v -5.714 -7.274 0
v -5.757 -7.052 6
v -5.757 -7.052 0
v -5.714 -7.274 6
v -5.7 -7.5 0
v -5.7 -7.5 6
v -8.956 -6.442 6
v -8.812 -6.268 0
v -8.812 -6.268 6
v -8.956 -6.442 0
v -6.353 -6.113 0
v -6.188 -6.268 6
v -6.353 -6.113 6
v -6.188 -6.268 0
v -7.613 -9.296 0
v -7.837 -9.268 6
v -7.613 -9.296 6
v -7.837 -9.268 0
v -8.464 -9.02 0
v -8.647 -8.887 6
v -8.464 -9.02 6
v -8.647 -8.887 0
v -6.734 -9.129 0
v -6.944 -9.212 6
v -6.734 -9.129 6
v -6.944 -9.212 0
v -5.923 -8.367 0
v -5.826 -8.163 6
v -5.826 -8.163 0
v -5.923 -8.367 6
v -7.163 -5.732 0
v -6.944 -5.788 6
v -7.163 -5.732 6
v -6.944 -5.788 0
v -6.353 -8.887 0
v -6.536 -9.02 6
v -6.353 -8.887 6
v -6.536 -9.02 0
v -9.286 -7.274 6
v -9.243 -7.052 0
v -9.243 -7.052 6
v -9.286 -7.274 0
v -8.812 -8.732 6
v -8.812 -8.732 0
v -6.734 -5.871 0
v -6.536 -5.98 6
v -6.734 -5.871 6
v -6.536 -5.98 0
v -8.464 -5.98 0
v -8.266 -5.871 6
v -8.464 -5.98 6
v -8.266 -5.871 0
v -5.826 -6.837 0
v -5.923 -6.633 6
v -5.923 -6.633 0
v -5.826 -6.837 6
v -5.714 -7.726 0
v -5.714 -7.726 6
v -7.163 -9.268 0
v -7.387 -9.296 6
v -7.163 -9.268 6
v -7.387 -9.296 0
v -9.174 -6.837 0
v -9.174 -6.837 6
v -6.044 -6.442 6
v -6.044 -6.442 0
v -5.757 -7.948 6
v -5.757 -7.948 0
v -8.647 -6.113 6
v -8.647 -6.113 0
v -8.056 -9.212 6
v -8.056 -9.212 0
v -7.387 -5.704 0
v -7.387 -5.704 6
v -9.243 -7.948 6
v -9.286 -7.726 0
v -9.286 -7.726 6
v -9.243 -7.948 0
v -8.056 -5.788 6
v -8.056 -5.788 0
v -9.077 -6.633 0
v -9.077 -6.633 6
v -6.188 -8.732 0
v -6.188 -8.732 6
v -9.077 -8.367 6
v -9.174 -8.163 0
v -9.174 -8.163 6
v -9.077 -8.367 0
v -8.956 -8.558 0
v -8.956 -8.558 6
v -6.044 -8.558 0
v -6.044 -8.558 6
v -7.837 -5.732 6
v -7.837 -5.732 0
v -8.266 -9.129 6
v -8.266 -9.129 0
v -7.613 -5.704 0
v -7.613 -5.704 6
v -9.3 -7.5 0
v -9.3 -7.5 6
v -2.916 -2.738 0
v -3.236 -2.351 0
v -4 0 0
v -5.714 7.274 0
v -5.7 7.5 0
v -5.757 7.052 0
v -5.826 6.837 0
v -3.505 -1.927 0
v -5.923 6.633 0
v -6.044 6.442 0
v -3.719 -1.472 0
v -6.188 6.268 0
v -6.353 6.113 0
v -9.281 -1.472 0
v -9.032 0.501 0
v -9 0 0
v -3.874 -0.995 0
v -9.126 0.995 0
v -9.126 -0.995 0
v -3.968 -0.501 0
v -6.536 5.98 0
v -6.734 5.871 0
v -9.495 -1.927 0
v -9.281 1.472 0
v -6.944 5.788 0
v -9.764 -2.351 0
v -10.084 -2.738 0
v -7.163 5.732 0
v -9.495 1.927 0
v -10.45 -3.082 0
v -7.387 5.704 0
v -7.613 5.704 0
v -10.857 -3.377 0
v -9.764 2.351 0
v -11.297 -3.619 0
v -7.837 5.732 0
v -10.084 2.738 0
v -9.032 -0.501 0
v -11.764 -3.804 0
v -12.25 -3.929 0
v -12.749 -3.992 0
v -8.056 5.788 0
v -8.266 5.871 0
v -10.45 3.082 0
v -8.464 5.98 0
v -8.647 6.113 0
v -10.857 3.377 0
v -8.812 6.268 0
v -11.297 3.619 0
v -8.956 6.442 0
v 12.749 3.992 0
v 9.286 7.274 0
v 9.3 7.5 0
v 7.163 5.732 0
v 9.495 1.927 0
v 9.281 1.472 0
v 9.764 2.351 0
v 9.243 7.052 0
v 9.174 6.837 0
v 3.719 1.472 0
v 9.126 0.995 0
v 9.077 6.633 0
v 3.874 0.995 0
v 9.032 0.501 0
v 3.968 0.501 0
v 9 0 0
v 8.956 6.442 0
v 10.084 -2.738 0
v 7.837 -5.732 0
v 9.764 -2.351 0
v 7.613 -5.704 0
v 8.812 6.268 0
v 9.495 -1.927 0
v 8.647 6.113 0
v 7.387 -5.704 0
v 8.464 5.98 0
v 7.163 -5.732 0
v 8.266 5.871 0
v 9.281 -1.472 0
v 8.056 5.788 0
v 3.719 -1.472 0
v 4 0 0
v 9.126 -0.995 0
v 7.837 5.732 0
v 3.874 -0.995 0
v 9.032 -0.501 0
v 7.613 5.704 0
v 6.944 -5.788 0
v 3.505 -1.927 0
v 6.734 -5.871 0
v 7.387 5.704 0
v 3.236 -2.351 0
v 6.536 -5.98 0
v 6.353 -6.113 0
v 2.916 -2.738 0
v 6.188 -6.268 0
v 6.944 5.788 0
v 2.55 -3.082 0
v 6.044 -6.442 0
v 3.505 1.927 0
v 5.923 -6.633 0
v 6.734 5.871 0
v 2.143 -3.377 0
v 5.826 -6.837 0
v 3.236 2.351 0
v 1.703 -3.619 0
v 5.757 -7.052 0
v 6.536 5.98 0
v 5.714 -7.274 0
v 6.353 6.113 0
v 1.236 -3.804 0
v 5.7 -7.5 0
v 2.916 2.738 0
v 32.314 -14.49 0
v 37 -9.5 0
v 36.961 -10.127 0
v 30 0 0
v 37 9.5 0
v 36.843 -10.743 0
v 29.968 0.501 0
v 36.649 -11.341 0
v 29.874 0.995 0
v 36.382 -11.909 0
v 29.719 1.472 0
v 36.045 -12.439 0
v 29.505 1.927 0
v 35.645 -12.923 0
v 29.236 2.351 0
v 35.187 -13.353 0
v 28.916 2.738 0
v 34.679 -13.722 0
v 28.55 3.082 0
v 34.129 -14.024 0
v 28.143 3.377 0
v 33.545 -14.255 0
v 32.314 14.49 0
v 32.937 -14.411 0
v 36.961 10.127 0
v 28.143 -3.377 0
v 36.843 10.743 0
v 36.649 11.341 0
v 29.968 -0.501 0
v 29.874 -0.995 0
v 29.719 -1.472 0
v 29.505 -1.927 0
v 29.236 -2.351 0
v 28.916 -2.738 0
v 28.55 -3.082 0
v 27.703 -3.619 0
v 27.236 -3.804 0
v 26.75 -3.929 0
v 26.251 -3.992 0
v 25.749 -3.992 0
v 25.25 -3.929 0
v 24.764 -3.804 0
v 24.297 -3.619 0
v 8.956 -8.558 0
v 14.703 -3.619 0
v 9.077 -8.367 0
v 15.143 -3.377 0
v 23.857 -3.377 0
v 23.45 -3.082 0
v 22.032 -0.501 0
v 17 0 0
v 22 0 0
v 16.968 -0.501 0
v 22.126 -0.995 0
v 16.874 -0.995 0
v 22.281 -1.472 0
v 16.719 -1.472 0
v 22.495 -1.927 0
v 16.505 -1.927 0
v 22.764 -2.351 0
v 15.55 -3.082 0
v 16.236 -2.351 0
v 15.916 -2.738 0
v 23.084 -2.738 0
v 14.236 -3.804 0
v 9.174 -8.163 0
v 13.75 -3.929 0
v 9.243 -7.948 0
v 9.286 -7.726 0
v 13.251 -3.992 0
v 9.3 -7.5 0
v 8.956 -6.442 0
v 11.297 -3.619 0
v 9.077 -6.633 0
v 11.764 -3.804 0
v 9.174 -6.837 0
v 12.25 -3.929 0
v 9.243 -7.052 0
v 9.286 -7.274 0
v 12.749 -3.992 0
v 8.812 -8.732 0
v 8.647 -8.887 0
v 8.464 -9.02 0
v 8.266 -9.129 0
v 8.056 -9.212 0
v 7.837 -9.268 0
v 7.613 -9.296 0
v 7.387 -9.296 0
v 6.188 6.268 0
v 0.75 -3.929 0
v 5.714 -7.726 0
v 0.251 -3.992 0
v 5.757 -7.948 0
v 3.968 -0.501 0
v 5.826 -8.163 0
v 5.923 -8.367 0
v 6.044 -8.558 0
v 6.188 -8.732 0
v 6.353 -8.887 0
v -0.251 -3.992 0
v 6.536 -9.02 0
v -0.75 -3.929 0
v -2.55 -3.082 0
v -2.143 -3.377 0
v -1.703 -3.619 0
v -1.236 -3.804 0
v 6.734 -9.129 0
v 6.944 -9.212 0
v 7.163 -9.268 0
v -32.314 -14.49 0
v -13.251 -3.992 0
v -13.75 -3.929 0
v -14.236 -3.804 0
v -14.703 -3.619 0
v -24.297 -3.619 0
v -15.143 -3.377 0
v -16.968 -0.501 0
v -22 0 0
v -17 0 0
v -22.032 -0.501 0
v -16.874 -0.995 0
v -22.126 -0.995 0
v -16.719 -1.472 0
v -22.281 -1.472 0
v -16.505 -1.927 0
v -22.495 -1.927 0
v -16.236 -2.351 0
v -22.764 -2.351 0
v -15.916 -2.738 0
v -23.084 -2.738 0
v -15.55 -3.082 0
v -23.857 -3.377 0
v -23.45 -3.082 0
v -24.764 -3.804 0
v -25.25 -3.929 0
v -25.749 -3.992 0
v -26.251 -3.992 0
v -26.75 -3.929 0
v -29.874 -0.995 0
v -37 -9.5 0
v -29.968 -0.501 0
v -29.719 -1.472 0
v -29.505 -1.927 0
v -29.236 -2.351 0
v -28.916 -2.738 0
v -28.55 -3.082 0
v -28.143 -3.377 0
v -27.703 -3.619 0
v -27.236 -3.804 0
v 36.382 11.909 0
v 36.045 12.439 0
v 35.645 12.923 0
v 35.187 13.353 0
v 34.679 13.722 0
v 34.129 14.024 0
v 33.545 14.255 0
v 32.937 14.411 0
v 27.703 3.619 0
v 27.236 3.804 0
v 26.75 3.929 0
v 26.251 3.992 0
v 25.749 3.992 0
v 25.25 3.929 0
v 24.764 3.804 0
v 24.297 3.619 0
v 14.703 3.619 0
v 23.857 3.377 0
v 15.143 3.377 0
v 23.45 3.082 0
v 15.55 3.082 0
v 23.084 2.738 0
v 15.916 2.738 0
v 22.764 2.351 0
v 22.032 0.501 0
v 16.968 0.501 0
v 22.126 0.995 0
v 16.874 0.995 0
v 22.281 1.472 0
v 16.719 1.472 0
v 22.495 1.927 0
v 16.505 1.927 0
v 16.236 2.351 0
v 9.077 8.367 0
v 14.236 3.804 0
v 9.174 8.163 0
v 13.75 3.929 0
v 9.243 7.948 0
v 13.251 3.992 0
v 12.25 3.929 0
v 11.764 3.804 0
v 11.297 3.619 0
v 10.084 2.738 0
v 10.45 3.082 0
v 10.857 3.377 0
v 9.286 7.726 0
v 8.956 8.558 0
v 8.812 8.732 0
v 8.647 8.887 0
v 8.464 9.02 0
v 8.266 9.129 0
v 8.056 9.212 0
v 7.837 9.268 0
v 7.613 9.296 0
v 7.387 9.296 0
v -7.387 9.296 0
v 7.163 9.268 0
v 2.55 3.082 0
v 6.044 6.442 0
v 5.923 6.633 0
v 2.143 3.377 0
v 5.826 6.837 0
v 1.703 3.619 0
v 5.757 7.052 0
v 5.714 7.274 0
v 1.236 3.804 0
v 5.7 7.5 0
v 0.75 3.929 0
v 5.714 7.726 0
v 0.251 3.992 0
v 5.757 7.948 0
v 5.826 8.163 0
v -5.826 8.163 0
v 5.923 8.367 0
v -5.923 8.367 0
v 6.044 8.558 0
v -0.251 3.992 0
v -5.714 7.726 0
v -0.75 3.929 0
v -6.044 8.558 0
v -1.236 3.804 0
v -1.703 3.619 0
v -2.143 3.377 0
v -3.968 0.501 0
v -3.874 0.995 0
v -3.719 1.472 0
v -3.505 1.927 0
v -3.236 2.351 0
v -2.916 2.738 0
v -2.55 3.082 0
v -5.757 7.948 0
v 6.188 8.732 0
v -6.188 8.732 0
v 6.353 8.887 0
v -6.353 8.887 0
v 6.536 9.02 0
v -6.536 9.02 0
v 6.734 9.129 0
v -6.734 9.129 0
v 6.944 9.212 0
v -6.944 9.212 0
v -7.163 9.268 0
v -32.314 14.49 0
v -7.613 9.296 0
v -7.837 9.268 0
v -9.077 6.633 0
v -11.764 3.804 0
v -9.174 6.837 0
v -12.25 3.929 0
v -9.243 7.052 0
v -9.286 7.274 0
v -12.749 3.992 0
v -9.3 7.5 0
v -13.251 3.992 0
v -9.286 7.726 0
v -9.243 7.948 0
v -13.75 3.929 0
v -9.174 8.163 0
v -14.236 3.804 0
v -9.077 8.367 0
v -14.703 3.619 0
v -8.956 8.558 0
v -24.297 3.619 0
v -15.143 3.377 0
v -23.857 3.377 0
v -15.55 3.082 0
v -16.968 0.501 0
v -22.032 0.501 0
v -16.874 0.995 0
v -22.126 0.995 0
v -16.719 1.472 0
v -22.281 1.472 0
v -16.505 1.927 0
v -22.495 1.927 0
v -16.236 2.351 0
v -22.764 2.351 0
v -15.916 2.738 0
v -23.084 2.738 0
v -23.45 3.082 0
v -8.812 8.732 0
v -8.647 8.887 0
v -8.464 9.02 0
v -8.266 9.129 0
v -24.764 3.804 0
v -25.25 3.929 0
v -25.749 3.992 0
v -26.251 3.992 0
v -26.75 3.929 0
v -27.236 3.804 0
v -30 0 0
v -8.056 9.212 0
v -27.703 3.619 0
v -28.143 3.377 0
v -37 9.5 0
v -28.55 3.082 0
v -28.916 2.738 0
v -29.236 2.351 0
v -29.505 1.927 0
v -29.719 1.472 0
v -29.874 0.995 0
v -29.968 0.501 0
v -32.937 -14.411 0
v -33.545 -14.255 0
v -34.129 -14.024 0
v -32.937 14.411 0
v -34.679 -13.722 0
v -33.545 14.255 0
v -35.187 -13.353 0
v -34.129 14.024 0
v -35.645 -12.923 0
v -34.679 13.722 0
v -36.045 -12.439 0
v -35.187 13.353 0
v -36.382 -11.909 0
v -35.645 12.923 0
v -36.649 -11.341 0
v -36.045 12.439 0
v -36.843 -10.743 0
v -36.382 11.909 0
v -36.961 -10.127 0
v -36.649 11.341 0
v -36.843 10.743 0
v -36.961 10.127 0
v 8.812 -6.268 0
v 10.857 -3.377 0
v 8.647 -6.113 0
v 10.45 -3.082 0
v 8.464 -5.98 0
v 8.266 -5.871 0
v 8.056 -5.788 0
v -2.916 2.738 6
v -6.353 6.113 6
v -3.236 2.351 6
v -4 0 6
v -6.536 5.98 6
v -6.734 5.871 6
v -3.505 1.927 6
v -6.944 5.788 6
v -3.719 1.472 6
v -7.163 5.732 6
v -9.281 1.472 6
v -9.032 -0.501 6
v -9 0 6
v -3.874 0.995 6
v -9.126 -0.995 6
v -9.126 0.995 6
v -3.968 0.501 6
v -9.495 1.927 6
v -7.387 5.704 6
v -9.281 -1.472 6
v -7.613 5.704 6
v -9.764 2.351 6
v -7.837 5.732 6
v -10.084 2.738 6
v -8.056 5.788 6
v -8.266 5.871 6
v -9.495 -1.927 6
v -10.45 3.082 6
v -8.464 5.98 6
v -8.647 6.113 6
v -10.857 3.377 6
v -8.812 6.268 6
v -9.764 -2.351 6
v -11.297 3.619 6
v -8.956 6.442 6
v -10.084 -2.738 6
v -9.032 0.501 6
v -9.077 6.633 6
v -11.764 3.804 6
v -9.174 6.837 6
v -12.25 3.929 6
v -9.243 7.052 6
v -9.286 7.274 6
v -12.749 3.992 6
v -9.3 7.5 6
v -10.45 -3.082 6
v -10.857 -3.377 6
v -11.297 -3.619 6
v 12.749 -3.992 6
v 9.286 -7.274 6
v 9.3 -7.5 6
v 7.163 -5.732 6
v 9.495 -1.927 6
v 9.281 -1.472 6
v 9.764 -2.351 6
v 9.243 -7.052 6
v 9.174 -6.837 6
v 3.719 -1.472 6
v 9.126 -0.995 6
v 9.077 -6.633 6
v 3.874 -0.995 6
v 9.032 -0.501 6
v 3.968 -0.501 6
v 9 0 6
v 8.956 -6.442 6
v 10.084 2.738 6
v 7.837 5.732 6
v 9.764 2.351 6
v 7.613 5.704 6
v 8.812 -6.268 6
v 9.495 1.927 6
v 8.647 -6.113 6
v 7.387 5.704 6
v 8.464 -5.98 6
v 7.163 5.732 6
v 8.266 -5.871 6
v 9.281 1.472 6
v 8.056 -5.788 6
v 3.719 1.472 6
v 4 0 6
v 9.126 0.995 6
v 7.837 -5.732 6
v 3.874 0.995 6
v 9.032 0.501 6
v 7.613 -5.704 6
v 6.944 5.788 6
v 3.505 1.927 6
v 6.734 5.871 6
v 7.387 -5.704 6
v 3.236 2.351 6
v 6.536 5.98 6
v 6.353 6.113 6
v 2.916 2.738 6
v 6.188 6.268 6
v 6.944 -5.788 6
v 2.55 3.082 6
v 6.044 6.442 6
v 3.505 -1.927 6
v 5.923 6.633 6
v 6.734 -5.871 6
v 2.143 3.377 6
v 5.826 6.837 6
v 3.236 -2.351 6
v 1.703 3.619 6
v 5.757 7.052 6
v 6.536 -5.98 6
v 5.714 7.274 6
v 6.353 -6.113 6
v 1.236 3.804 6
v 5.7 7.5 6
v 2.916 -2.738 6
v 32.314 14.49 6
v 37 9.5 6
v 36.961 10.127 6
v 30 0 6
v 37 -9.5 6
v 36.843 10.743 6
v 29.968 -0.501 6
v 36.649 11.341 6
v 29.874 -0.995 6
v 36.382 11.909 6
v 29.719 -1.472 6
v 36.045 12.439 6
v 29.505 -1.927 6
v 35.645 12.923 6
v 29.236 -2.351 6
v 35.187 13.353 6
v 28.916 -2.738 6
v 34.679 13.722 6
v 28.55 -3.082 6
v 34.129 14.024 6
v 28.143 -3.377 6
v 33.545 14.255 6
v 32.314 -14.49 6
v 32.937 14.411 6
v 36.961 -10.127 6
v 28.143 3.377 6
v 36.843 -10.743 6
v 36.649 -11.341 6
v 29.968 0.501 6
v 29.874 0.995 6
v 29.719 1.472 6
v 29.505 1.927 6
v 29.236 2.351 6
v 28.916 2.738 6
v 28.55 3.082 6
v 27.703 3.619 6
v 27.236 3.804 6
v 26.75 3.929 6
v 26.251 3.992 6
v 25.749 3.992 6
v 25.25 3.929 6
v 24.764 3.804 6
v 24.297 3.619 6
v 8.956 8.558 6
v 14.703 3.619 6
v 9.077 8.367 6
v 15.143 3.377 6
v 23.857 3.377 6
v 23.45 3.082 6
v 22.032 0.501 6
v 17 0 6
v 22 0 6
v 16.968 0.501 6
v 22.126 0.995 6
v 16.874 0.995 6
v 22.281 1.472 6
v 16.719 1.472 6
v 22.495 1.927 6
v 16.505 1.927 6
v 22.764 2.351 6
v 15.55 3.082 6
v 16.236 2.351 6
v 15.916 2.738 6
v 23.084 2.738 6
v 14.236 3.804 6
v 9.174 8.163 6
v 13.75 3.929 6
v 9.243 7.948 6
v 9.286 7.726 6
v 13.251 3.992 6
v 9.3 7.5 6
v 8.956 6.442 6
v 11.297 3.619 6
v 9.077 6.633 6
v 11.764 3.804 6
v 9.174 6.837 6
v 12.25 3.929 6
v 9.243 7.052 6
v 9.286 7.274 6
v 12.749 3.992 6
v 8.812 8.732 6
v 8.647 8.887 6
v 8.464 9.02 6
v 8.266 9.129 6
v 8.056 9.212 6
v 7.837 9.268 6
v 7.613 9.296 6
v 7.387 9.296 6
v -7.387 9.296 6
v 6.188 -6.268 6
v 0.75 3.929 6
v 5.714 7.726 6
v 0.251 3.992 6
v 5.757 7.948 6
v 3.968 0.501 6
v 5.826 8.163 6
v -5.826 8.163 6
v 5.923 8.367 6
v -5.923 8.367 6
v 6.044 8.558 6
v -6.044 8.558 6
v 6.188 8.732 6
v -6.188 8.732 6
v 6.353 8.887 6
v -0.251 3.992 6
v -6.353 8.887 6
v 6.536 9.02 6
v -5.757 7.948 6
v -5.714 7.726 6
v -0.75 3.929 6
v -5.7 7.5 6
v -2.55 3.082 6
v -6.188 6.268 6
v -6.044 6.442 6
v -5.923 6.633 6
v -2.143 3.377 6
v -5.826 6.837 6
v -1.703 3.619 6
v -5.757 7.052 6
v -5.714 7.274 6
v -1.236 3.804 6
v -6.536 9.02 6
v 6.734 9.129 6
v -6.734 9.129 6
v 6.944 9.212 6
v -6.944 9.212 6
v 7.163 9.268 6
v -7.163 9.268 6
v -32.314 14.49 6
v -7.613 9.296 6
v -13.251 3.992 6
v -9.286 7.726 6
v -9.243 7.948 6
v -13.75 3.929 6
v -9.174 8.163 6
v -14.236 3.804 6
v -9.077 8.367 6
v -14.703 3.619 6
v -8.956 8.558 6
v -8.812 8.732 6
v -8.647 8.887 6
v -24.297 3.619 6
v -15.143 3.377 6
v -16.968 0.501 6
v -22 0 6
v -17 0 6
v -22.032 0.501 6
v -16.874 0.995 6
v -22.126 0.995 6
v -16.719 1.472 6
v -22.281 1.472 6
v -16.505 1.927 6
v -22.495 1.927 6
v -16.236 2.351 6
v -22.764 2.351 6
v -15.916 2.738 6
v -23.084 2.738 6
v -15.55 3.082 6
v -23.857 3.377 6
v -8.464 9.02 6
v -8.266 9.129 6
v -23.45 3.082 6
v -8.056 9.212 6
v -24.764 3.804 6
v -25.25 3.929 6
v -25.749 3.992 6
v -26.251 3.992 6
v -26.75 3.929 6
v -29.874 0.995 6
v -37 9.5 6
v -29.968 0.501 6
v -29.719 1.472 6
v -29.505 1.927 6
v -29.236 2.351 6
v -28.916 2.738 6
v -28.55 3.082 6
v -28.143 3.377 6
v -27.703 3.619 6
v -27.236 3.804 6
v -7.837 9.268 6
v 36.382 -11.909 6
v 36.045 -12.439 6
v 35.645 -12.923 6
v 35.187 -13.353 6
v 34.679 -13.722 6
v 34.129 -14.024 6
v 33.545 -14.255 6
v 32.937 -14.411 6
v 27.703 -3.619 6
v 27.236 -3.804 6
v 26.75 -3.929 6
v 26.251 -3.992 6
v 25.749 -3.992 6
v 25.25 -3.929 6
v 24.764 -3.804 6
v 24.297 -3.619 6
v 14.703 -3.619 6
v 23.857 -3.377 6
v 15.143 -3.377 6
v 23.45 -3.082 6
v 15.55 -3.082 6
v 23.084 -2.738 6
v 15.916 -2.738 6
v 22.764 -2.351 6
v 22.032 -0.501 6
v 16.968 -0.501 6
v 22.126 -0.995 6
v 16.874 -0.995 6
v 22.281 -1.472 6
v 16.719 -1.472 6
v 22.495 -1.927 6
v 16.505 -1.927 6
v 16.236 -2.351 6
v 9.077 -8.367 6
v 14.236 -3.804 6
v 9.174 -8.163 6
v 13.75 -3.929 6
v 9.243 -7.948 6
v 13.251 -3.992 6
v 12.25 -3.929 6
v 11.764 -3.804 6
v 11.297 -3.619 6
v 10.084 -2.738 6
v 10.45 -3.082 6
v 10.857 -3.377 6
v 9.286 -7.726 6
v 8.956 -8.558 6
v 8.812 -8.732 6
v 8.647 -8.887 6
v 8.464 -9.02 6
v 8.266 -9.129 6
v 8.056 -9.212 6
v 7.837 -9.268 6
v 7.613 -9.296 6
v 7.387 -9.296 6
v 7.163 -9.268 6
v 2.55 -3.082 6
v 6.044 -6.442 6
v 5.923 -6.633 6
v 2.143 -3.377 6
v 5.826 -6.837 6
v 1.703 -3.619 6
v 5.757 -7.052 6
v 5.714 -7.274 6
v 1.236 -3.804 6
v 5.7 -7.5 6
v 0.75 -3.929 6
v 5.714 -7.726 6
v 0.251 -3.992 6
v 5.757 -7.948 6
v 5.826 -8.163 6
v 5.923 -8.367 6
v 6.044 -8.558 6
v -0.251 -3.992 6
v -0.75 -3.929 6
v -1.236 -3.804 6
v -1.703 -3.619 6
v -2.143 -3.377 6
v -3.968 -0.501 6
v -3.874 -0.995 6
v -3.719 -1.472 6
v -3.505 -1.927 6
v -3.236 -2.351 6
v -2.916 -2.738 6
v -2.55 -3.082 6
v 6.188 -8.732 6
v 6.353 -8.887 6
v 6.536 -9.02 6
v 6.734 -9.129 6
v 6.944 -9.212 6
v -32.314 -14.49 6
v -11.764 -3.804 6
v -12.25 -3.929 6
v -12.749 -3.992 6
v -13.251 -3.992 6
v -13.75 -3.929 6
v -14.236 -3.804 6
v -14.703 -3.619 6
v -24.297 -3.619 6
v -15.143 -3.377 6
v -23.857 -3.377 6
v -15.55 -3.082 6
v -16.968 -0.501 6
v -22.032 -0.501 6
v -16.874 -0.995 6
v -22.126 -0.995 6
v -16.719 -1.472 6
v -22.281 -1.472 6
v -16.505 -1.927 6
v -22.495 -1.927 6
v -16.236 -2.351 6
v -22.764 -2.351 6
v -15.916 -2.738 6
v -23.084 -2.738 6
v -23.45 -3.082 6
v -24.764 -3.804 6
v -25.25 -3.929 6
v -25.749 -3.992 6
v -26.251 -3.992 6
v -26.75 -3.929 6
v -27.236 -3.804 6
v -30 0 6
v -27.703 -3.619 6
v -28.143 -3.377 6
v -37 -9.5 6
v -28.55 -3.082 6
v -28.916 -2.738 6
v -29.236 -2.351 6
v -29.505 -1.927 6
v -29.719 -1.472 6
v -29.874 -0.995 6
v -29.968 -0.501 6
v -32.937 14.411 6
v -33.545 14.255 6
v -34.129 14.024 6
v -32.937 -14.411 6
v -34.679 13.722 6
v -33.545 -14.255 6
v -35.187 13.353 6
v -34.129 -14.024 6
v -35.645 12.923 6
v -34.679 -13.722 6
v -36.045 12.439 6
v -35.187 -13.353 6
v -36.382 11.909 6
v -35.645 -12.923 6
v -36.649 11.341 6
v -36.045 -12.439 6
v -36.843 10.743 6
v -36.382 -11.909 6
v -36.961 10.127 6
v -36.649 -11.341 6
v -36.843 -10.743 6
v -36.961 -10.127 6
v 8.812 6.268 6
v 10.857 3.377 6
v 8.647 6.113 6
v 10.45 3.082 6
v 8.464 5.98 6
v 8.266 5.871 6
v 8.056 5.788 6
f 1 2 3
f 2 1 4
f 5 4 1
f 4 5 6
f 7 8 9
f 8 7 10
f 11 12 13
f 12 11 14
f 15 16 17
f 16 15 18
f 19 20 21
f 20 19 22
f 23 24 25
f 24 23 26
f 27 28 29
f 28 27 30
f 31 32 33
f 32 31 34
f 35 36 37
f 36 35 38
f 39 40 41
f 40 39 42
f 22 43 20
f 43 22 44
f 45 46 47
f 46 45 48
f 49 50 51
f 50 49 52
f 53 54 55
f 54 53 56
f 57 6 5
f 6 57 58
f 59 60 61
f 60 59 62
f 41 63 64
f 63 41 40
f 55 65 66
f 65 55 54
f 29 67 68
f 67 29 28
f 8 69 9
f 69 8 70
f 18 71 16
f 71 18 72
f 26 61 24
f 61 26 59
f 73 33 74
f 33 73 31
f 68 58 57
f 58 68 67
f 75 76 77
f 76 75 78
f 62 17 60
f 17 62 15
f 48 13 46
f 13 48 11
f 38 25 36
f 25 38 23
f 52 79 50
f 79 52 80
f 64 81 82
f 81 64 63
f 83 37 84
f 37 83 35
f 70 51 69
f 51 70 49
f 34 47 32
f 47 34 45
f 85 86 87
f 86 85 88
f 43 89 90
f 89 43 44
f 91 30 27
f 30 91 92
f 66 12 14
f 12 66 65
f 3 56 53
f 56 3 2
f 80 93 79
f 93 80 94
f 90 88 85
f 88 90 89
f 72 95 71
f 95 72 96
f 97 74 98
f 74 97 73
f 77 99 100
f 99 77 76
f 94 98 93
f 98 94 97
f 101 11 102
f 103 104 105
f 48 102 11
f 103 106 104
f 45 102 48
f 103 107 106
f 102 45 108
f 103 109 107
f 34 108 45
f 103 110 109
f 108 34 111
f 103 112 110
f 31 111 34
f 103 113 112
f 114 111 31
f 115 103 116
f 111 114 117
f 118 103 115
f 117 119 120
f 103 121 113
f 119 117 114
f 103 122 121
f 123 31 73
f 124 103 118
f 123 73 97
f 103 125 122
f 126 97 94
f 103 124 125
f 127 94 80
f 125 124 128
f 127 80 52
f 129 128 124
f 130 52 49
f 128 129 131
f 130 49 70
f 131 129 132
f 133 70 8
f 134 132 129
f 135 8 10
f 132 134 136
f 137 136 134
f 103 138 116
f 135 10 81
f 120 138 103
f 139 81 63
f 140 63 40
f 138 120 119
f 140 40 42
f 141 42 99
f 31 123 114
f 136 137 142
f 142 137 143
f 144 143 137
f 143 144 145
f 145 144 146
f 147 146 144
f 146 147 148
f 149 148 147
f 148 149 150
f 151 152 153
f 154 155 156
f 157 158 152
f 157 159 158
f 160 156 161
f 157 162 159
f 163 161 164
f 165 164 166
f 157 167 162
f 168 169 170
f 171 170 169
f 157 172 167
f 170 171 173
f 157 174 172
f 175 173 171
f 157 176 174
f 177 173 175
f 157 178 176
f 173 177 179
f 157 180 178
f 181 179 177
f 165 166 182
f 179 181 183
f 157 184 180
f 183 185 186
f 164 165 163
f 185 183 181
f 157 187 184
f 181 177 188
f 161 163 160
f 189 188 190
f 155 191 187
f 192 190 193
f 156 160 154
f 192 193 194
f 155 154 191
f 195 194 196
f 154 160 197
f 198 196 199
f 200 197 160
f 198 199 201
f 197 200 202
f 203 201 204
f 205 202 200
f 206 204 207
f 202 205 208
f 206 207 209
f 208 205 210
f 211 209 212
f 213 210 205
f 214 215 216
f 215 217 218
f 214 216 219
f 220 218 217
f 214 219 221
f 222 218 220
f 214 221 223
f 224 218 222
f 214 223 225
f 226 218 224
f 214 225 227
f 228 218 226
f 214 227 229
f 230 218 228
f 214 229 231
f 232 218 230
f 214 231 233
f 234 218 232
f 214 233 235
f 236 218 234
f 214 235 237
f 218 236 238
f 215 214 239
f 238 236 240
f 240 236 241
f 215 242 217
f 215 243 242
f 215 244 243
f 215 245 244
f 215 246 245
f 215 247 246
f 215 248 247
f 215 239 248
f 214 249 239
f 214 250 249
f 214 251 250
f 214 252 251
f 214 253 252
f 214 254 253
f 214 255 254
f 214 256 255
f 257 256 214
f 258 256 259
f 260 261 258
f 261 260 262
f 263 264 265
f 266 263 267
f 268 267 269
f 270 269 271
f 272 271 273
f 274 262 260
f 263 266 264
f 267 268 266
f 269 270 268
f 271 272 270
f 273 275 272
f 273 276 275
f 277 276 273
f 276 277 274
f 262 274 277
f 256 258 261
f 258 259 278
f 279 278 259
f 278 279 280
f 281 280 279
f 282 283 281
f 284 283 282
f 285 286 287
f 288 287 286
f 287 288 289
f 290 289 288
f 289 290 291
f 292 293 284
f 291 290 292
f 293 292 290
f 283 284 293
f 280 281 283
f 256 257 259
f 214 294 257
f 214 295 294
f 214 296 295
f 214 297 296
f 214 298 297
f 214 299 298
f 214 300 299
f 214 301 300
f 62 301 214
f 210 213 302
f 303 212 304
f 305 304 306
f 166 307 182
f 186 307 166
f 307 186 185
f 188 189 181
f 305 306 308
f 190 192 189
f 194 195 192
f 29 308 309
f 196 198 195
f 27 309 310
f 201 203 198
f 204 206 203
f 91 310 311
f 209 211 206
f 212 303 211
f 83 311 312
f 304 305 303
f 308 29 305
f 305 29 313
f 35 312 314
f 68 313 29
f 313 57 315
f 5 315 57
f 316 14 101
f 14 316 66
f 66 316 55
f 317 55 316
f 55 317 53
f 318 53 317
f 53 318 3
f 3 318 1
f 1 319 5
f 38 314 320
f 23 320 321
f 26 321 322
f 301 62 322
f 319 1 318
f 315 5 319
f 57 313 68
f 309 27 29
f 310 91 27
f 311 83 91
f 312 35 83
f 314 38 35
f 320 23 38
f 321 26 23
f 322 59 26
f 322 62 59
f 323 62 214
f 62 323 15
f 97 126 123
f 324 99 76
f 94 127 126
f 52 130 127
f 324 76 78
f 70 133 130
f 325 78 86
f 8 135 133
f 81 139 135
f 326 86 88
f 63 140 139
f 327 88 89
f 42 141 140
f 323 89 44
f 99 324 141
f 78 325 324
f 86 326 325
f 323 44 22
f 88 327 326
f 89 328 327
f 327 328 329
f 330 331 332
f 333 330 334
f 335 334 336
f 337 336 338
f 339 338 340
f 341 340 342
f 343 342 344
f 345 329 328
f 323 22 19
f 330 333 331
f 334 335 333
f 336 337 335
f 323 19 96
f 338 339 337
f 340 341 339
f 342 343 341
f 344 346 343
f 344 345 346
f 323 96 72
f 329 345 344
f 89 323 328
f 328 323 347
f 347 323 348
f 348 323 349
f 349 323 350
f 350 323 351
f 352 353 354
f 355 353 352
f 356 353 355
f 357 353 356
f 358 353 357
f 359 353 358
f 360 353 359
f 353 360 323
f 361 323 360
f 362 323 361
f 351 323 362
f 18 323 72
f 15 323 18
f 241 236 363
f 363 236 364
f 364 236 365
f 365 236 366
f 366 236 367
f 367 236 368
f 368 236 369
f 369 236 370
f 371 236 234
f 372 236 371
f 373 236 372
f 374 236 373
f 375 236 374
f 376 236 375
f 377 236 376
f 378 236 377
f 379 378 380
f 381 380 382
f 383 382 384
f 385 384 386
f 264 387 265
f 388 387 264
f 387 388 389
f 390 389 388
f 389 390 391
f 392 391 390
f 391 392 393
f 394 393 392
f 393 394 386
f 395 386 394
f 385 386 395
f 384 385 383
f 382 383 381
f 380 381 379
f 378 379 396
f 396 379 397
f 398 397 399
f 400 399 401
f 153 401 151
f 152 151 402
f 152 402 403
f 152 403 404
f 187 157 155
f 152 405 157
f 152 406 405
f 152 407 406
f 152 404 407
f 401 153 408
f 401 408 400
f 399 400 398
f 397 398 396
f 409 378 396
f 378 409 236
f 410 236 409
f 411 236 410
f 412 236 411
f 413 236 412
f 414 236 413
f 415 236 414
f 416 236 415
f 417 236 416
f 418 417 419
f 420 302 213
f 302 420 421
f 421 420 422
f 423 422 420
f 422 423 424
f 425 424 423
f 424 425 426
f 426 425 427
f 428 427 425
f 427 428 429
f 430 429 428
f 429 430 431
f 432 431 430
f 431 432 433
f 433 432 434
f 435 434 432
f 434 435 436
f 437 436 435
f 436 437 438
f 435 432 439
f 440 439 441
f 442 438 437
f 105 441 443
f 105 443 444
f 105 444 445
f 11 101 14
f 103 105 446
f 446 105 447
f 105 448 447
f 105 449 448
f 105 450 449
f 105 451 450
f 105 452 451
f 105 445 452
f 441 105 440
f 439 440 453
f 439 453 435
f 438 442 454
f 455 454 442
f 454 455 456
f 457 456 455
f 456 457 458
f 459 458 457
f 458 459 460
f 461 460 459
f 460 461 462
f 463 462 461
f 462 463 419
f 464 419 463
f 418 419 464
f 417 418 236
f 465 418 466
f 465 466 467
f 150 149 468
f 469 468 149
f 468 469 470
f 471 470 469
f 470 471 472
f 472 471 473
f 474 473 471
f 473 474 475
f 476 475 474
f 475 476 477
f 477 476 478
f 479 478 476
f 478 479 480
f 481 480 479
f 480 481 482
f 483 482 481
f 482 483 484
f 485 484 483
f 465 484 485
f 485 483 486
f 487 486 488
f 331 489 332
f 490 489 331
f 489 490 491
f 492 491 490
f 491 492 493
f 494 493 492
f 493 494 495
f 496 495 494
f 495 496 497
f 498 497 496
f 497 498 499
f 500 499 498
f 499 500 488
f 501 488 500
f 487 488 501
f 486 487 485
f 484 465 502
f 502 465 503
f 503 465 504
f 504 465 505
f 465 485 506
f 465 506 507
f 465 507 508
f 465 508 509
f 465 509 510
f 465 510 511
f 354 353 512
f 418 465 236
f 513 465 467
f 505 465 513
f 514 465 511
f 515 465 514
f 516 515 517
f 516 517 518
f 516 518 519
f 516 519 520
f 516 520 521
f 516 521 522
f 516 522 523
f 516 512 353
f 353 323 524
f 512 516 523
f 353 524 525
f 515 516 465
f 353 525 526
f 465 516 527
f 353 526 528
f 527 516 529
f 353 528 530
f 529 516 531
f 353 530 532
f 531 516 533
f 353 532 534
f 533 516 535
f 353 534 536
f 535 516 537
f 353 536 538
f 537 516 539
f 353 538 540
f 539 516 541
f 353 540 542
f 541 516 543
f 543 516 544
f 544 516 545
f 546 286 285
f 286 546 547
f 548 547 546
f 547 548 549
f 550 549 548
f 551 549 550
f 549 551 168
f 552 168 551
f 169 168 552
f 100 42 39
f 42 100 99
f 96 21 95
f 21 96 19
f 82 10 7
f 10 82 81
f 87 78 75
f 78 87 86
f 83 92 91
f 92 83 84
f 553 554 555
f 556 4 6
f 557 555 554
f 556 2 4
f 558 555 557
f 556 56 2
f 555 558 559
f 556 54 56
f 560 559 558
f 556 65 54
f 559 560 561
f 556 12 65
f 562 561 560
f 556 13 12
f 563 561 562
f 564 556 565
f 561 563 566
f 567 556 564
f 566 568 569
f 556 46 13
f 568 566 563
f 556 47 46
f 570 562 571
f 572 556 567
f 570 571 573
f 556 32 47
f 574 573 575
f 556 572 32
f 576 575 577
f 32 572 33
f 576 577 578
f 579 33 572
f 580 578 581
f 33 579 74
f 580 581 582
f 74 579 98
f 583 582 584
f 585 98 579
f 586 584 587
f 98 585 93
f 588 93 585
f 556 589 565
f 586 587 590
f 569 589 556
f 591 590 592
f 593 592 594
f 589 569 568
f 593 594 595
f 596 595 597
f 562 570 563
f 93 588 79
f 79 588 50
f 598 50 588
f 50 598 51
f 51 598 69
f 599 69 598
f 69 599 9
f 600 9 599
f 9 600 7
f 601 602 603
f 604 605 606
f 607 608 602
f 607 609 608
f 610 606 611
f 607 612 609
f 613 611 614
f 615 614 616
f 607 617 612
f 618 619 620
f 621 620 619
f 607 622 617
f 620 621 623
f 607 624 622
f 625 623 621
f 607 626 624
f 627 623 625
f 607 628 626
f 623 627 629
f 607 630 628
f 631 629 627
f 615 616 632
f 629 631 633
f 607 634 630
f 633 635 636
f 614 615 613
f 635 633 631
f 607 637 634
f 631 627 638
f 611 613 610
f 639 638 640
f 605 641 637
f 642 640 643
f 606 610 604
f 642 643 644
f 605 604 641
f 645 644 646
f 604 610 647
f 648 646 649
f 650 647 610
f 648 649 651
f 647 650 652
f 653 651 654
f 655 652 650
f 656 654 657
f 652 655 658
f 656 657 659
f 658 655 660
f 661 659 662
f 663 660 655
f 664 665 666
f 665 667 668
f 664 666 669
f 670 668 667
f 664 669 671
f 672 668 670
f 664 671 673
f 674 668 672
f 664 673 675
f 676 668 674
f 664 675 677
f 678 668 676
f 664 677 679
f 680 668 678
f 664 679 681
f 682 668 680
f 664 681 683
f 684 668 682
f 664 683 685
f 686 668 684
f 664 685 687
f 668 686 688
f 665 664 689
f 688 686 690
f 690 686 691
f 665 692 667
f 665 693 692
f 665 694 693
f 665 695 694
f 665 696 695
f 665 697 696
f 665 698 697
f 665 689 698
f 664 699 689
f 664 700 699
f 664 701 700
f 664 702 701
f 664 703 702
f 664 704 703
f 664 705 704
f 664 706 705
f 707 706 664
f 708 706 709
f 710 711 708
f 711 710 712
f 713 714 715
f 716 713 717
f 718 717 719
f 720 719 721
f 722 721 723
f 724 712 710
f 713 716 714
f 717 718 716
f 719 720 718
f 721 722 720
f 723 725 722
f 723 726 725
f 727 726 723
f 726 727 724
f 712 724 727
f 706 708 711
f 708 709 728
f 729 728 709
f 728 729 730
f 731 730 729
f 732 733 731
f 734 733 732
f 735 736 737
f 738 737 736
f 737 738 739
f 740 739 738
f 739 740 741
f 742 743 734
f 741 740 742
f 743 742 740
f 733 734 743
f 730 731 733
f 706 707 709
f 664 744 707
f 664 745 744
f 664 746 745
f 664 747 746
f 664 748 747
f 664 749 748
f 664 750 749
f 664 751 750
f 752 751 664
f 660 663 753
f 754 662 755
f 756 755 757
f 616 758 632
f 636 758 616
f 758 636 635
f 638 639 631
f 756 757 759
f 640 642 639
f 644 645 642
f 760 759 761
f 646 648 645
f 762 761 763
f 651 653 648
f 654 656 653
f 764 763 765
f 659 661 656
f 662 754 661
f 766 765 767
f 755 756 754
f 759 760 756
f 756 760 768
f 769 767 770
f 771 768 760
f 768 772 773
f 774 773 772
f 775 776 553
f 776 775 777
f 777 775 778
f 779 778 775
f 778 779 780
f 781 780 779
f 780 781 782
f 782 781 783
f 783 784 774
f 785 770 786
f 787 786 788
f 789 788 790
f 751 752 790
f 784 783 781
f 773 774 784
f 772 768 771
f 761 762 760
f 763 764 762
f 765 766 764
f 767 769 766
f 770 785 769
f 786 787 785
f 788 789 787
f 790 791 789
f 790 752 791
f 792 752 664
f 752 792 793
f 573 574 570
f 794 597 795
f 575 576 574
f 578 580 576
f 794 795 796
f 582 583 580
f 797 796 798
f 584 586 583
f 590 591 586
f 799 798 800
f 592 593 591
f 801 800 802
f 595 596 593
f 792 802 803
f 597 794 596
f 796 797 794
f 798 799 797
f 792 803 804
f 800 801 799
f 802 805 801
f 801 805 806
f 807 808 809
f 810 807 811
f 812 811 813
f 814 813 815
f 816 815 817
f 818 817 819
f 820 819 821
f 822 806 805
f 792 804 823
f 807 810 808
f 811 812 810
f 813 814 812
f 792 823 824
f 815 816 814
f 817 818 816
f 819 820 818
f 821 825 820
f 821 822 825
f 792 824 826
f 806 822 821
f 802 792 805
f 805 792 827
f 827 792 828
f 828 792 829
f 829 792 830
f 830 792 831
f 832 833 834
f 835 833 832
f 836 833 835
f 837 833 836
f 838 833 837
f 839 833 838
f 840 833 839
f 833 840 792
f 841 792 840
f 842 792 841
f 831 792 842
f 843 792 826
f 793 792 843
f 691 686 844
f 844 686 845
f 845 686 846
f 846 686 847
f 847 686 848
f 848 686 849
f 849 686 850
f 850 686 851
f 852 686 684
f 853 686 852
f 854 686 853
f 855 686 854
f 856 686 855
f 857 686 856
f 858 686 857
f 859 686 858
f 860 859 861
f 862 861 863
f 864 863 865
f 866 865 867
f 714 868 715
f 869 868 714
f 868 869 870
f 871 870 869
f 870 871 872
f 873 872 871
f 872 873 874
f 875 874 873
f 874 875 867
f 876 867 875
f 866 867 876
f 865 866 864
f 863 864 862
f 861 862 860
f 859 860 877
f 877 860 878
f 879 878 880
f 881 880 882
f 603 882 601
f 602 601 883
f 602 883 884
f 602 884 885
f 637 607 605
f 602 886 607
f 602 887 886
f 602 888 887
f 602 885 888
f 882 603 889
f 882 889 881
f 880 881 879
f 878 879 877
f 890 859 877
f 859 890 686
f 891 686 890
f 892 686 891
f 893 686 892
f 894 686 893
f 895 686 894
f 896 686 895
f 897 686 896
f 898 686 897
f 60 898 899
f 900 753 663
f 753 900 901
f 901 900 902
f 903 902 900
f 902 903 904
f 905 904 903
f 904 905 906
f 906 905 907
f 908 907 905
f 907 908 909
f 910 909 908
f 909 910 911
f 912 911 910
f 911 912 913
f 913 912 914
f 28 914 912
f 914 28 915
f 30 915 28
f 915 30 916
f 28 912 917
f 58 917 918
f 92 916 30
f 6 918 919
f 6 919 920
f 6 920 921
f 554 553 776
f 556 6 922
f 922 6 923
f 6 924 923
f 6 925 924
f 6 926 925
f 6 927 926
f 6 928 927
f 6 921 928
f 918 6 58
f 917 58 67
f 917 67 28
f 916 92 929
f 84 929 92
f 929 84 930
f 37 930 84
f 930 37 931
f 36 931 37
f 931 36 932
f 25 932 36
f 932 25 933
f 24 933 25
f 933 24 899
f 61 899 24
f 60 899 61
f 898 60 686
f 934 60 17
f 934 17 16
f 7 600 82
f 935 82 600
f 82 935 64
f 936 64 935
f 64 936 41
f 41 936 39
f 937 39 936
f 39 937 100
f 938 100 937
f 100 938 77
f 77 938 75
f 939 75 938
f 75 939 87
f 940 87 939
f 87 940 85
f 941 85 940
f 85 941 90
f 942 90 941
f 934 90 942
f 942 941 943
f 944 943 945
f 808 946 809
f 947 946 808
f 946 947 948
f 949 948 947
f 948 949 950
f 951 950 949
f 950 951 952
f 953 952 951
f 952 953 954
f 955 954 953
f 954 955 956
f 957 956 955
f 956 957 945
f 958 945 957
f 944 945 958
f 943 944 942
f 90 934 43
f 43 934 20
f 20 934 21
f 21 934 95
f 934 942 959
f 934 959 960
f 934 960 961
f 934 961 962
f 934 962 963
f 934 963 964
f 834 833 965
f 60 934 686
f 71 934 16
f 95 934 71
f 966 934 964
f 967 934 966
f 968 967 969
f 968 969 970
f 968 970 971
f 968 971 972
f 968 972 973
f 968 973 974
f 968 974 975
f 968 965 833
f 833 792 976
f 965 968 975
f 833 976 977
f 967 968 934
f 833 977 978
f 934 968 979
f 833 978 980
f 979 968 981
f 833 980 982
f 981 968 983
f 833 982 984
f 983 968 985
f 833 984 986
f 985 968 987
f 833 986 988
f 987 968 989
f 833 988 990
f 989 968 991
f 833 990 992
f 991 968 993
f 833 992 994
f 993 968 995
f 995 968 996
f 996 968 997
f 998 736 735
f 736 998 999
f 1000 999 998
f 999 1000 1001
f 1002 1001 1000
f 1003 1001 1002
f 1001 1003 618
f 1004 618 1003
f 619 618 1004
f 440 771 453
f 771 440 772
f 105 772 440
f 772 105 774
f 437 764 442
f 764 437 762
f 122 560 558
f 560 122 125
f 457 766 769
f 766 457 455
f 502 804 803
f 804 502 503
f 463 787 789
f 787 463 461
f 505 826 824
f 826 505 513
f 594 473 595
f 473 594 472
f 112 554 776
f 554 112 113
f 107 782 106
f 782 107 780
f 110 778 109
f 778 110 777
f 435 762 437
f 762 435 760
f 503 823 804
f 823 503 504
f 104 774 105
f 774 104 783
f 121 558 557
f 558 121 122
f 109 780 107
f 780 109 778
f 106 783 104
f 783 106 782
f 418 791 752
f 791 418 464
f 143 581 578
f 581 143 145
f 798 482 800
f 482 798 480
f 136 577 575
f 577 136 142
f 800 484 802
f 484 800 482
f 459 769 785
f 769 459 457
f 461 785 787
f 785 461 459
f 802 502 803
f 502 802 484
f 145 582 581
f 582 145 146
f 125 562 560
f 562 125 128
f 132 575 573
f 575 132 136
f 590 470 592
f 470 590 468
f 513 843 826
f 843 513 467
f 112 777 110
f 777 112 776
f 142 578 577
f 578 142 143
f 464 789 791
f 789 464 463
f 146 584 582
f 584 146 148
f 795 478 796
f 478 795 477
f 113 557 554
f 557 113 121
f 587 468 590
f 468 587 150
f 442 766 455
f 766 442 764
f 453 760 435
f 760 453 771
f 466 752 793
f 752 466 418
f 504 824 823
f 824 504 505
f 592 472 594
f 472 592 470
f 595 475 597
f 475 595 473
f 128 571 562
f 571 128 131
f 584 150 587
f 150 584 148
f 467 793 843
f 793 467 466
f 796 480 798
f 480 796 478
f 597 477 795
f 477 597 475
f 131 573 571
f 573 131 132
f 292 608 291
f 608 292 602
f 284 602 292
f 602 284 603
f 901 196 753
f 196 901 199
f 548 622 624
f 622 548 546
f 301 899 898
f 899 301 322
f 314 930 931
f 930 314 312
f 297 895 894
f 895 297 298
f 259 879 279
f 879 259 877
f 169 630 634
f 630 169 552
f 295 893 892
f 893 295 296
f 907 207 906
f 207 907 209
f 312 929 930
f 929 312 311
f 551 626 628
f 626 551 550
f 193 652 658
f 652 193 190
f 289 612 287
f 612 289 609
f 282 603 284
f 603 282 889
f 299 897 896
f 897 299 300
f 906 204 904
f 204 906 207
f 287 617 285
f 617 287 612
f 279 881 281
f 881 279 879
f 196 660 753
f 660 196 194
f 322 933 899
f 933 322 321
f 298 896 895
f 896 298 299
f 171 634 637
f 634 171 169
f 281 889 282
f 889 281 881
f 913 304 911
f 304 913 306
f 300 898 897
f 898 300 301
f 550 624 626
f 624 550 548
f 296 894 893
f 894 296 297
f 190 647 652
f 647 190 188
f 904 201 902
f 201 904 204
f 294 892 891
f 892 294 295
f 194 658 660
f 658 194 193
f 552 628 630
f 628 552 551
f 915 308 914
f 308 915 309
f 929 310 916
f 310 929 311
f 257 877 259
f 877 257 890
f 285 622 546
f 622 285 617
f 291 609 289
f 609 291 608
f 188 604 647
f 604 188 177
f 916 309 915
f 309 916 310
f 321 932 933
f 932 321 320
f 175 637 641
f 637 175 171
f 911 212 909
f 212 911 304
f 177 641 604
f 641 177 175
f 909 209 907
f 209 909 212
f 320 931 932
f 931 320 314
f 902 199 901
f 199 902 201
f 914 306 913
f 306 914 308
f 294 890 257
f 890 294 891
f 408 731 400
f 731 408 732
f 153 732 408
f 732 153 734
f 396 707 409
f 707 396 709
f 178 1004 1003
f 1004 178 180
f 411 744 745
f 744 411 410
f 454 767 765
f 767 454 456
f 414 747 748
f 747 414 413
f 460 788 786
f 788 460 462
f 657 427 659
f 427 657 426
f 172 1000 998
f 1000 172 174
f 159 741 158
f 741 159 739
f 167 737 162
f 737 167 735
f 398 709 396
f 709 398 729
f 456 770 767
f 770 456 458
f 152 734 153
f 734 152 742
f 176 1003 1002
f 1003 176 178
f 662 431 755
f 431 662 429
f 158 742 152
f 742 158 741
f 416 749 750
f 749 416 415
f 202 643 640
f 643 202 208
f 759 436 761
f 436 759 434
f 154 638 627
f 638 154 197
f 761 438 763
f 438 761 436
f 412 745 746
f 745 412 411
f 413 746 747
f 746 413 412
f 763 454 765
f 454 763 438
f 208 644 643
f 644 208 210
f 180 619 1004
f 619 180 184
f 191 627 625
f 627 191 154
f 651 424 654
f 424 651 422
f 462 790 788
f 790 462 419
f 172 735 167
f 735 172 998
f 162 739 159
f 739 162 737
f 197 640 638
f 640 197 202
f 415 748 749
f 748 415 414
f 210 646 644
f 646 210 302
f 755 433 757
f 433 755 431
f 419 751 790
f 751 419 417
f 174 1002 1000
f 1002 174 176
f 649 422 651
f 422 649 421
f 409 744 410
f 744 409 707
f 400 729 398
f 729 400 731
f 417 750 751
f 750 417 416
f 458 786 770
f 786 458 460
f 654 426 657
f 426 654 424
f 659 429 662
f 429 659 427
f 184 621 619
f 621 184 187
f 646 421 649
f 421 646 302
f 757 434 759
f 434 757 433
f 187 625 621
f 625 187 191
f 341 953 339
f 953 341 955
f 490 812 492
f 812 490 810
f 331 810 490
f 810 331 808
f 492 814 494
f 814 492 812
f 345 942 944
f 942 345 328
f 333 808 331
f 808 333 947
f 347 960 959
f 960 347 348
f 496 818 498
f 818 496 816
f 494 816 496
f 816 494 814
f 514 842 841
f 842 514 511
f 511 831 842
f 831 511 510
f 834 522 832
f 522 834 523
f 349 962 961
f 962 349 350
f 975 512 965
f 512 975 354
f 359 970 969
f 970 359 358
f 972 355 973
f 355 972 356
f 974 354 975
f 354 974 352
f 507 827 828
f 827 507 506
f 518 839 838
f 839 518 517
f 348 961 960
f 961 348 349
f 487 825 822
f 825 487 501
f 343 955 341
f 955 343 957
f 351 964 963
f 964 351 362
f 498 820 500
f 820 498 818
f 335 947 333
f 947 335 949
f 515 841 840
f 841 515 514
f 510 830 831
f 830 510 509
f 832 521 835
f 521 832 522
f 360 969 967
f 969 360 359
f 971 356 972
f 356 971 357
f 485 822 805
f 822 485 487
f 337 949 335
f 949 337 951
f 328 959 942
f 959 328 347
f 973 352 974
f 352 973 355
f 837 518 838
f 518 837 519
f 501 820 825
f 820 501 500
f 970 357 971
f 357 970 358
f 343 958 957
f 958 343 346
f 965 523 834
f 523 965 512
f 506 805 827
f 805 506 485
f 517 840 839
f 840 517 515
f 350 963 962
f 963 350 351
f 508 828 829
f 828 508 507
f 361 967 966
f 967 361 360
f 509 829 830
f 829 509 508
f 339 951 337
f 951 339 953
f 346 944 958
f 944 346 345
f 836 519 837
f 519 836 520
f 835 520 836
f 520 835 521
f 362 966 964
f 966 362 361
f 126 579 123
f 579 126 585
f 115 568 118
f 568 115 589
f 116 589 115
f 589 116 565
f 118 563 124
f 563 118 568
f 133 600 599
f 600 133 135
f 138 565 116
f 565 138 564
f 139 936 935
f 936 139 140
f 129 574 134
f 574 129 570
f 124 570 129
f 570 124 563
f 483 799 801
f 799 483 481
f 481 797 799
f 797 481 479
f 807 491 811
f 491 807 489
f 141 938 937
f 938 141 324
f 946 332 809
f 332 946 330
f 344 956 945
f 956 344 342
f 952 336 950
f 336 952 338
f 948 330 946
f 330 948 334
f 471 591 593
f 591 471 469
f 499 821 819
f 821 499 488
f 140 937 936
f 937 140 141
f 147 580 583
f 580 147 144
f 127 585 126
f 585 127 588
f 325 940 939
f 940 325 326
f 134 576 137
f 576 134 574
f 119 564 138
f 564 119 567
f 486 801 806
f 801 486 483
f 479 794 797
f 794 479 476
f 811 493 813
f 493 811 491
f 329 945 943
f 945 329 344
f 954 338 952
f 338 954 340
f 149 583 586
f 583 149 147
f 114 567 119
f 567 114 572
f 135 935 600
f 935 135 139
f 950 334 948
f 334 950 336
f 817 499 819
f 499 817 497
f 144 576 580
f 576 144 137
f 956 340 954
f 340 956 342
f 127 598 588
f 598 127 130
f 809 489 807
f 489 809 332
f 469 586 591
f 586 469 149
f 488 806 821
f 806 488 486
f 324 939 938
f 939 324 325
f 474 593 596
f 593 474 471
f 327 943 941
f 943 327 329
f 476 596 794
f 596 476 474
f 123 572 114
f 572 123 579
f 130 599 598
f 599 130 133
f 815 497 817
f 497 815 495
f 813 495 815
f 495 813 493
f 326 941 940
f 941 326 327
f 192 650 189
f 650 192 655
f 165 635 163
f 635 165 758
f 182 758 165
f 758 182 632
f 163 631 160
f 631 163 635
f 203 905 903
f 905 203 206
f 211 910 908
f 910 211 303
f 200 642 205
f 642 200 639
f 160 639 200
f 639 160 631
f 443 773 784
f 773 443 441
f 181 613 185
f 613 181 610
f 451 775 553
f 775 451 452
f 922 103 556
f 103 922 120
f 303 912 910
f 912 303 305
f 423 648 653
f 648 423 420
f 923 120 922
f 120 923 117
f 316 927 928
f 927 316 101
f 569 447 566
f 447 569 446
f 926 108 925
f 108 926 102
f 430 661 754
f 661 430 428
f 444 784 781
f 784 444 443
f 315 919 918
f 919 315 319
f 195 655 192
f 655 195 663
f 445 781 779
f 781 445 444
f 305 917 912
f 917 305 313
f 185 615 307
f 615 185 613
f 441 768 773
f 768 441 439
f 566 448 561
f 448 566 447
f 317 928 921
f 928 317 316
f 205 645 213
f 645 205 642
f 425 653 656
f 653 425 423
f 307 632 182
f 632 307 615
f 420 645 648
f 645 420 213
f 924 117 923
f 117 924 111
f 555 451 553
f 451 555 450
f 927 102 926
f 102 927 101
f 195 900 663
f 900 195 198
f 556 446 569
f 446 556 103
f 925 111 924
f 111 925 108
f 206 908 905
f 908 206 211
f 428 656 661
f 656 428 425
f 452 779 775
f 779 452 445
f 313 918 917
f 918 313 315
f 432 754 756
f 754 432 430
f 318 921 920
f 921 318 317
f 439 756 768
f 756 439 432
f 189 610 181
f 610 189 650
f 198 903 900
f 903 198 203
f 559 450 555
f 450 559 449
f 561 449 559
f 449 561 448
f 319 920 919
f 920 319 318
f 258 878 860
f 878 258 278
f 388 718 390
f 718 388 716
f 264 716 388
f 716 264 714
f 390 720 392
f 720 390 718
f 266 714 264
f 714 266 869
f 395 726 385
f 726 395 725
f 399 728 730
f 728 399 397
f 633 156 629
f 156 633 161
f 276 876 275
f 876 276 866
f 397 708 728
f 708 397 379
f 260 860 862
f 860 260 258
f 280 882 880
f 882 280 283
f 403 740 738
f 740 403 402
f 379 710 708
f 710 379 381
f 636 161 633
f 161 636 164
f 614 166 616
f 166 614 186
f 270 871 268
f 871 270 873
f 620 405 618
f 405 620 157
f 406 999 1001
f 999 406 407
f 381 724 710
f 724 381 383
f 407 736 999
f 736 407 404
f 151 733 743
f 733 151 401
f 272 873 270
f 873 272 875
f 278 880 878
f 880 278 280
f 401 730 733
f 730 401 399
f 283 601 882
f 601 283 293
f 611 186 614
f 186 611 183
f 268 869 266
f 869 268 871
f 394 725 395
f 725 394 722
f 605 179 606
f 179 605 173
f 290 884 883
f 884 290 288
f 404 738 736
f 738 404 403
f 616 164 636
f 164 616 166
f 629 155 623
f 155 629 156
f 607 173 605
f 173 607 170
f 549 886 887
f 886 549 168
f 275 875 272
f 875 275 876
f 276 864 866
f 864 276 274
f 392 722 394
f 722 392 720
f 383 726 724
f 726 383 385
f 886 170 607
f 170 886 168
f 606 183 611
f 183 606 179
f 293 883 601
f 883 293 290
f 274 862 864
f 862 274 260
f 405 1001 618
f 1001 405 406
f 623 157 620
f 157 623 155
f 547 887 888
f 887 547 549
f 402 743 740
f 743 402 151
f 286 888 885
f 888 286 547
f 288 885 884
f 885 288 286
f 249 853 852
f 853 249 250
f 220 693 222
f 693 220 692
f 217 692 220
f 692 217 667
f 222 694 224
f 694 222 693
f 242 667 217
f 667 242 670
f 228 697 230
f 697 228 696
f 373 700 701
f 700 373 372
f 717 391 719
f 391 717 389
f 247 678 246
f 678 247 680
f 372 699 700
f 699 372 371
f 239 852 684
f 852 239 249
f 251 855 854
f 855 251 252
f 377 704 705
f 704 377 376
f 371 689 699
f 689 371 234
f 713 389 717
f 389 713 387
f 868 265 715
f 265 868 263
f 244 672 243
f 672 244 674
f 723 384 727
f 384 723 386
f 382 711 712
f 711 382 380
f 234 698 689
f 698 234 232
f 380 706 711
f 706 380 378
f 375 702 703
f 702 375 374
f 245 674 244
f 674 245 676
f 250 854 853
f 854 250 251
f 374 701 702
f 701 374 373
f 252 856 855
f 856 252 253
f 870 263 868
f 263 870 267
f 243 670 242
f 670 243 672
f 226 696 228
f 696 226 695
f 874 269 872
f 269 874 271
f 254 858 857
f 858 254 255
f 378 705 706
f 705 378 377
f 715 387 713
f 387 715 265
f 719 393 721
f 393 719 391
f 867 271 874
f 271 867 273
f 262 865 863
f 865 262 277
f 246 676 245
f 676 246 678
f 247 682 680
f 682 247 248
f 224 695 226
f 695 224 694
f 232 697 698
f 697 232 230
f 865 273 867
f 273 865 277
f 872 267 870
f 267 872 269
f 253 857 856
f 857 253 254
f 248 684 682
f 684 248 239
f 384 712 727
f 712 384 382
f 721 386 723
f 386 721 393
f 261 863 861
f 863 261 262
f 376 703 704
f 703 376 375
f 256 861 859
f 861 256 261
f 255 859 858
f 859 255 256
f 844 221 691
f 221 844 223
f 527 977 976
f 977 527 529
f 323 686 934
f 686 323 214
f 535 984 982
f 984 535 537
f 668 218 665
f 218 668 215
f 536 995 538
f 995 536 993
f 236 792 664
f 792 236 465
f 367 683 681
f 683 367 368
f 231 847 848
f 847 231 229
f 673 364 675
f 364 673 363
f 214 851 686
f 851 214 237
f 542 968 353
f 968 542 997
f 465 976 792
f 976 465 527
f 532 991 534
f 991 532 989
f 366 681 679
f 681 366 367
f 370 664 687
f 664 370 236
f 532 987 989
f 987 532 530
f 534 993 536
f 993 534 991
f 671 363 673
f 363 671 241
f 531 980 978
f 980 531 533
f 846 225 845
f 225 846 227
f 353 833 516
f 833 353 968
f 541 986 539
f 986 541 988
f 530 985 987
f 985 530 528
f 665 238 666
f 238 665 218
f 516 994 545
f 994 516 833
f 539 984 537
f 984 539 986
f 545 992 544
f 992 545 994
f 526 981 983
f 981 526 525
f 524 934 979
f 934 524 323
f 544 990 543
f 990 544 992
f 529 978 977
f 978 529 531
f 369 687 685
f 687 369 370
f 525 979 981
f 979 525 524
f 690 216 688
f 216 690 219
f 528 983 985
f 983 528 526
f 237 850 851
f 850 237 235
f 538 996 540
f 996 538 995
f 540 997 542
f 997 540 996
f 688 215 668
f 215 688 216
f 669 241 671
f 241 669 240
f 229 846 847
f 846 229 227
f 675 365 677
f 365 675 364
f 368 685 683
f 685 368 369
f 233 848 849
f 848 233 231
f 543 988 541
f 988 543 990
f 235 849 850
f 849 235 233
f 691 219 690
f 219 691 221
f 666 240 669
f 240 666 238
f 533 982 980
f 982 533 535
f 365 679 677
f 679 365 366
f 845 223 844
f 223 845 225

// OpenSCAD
$fn = 50;

difference() {
	union() {
		hull() {
			translate(v = [-32.0, 9.5, 0]) {
				cylinder(h = 6, r = 5);
			}
			translate(v = [32.0, 9.5, 0]) {
				cylinder(h = 6, r = 5);
			}
			translate(v = [-32.0, -9.5, 0]) {
				cylinder(h = 6, r = 5);
			}
			translate(v = [32.0, -9.5, 0]) {
				cylinder(h = 6, r = 5);
			}
		}
	}
	union() {
		translate(v = [-7.5, -7.5, 0]) {
			cylinder(h = 6, r = 1.8);
		}
		translate(v = [-7.5, 7.5, 0]) {
			cylinder(h = 6, r = 1.8);
		}
		translate(v = [7.5, -7.5, 0]) {
			cylinder(h = 6, r = 1.8);
		}
		translate(v = [7.5, 7.5, 0]) {
			cylinder(h = 6, r = 1.8);
		}
		translate(v = [-26.0, 0, 0.0]) {
			cylinder(h = 6, r = 4.0);
		}
		translate(v = [-13.0, 0, 0.0]) {
			cylinder(h = 6, r = 4.0);
		}
		cylinder(h = 6, r = 4.0);
		translate(v = [13.0, 0, 0.0]) {
			cylinder(h = 6, r = 4.0);
		}
		translate(v = [26.0, 0, 0.0]) {
			cylinder(h = 6, r = 4.0);
		}
	}
}
